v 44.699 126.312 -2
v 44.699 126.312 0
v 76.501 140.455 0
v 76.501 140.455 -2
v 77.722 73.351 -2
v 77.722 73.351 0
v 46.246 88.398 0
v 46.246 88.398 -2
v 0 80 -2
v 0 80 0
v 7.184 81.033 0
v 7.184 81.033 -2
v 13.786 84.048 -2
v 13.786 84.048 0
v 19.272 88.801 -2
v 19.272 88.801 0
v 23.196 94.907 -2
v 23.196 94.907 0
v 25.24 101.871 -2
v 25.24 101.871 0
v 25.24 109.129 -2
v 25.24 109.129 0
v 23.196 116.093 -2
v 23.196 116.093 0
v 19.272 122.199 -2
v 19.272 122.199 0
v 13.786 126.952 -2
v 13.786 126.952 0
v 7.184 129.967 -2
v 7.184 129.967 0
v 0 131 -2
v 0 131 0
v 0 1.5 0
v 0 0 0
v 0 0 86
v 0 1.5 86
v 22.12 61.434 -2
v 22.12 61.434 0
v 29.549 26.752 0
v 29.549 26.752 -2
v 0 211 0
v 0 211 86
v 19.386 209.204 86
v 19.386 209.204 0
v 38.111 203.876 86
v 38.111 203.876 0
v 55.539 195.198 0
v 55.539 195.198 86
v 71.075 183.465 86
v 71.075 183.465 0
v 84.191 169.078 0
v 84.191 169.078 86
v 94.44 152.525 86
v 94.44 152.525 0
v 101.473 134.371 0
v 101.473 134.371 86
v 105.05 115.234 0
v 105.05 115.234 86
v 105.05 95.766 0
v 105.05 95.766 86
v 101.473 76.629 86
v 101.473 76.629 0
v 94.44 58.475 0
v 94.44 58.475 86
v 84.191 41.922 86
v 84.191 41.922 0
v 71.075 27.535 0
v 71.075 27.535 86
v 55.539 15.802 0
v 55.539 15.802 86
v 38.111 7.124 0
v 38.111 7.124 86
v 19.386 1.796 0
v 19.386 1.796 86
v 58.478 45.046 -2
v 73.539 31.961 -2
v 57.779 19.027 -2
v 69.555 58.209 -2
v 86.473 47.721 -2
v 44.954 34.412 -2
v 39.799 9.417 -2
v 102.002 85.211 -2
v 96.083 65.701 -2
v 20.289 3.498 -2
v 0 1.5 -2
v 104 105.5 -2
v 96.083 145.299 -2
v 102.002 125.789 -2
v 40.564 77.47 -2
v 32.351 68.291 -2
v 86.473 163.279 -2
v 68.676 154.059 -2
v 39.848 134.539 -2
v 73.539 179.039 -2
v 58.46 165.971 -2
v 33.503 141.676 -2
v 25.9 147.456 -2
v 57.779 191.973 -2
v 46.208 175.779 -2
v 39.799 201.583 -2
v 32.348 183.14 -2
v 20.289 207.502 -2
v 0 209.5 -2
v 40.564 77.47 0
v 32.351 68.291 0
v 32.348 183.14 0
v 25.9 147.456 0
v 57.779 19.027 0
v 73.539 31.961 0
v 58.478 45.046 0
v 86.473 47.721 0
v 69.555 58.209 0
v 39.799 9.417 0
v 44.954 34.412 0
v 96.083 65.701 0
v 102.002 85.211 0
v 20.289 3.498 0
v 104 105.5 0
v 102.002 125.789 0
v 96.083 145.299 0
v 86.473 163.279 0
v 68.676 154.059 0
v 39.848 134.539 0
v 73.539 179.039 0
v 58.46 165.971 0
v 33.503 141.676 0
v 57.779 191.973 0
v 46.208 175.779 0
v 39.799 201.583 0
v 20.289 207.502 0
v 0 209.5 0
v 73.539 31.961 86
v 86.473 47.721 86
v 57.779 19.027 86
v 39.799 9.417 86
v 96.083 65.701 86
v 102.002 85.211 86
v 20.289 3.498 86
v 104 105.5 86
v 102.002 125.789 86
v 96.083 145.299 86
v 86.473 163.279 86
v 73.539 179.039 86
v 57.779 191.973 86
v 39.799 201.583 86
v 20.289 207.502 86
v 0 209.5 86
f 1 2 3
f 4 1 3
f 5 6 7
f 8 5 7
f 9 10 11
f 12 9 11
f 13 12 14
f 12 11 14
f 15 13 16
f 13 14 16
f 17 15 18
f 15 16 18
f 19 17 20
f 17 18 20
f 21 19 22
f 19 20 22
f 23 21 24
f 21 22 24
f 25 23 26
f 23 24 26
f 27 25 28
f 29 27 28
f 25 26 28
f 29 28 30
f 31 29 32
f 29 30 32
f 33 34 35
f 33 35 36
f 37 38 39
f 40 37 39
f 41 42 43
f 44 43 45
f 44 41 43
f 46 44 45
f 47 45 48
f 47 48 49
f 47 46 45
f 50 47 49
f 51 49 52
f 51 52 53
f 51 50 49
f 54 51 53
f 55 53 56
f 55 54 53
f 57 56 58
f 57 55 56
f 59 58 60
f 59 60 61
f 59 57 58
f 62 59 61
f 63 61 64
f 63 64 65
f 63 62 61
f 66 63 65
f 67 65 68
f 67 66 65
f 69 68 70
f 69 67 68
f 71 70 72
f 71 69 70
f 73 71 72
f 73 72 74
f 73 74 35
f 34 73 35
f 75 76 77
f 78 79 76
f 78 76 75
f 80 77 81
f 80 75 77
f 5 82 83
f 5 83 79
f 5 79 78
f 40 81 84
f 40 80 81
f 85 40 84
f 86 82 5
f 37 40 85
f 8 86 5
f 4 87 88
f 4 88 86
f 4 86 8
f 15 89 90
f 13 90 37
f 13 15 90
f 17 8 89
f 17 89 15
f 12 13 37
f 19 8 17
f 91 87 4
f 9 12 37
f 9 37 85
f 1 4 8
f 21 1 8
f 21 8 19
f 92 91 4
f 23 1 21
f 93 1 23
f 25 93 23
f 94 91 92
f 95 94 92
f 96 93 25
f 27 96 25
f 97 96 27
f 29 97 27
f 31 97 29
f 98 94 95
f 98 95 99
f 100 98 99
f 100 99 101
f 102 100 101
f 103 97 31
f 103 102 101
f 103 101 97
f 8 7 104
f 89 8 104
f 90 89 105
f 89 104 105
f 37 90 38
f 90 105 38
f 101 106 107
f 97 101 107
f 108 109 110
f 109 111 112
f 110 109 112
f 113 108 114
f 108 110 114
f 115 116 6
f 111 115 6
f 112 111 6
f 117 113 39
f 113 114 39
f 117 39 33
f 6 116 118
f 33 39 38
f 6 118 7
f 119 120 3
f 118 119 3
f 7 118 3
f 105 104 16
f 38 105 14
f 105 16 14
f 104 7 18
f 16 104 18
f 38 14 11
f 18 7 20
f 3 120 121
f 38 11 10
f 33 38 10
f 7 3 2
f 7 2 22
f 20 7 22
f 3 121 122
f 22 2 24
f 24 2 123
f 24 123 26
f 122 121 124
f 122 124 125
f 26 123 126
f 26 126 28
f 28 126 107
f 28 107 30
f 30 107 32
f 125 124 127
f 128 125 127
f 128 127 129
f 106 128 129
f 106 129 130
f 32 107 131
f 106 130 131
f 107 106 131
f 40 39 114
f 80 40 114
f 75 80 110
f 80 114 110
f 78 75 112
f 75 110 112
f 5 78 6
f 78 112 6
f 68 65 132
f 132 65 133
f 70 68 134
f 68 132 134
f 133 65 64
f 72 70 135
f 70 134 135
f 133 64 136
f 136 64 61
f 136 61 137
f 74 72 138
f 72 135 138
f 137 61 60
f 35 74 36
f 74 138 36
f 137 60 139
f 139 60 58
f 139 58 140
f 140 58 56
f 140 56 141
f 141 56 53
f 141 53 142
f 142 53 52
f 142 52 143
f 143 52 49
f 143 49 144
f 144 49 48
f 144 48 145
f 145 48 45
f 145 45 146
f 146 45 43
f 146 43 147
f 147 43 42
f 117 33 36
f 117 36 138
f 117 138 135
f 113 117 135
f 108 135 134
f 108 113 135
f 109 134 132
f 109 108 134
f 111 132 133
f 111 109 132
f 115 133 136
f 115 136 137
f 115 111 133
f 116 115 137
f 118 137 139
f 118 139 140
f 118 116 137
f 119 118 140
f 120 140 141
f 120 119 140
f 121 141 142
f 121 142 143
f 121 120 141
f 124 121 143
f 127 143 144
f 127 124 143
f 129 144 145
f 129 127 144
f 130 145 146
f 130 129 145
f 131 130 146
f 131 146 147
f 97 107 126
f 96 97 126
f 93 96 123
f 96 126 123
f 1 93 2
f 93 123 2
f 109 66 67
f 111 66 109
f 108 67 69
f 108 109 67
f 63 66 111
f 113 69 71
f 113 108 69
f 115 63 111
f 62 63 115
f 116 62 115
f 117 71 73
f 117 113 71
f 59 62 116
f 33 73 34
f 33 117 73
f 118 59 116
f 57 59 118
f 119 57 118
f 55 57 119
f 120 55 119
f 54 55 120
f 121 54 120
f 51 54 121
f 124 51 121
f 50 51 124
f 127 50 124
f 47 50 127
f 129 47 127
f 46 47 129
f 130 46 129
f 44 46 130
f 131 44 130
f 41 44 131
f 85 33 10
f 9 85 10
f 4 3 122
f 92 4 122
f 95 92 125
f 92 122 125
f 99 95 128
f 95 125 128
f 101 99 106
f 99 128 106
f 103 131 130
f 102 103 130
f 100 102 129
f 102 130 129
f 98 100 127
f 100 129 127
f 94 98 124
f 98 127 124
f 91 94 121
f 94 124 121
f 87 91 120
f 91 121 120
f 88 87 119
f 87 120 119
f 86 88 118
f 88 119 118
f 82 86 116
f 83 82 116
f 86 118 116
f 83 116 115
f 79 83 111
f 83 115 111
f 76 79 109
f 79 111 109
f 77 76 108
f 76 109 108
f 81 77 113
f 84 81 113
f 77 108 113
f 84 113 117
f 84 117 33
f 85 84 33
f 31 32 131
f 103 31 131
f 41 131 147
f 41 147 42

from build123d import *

# Parameters (mm, degrees)
BOSS_EXTRUDE2_DEPTH = 86
BOSS_EXTRUDE3_DEPTH = 2


with BuildPart() as part:
    # Sketch1 → Boss-Extrude2 (new body)
    with BuildSketch(Plane.XY):
        with BuildLine():
            Line((0, 0), (0, 1.5))
            ThreePointArc((0, 1.5), (104, 105.5), (0, 209.5))
            Line((0, 209.5), (0, 211))
            ThreePointArc((0, 211), (105.5, 105.5), (0, 0))
        make_face()
    extrude(amount=BOSS_EXTRUDE2_DEPTH)


with BuildPart() as body_2:
    # Sketch2 → Boss-Extrude3 (new body)
    with BuildSketch(Plane(origin=(0, 0, 0), x_dir=(-1, 0, 0), z_dir=(0, 0, -1))):
        with BuildLine():
            ThreePointArc((0, 209.5), (-104, 105.5), (0, 1.5))
            Line((0, 1.5), (0, 80))
            ThreePointArc((0, 80), (-25.5, 105.5), (0, 131))
            Line((0, 131), (0, 209.5))
        make_face()
        with BuildLine():
            ThreePointArc((-46.245759675, 88.398463435), (-36.745535683, 72.622979938), (-22.119655523, 61.433531111))
            Line((-22.119655523, 61.433531111), (-29.548996217, 26.752484238))
            ThreePointArc((-29.548996217, 26.752484238), (-58.477652485, 45.046062362), (-77.722279832, 73.350946611))
            Line((-77.722279832, 73.350946611), (-46.245759675, 88.398463435))
        make_face(mode=Mode.SUBTRACT)
        with BuildLine():
            ThreePointArc((-76.501203433, 140.455404294), (-58.459528985, 165.97146341), (-32.347829053, 183.13976025))
            Line((-32.347829053, 183.13976025), (-25.900416602, 147.455944282))
            ThreePointArc((-25.900416602, 147.455944282), (-36.848789706, 138.261250556), (-44.698922375, 126.311996043))
            Line((-44.698922375, 126.311996043), (-76.501203433, 140.455404294))
        make_face(mode=Mode.SUBTRACT)
    extrude(amount=BOSS_EXTRUDE3_DEPTH)


solid = Compound([part.part, body_2.part])
